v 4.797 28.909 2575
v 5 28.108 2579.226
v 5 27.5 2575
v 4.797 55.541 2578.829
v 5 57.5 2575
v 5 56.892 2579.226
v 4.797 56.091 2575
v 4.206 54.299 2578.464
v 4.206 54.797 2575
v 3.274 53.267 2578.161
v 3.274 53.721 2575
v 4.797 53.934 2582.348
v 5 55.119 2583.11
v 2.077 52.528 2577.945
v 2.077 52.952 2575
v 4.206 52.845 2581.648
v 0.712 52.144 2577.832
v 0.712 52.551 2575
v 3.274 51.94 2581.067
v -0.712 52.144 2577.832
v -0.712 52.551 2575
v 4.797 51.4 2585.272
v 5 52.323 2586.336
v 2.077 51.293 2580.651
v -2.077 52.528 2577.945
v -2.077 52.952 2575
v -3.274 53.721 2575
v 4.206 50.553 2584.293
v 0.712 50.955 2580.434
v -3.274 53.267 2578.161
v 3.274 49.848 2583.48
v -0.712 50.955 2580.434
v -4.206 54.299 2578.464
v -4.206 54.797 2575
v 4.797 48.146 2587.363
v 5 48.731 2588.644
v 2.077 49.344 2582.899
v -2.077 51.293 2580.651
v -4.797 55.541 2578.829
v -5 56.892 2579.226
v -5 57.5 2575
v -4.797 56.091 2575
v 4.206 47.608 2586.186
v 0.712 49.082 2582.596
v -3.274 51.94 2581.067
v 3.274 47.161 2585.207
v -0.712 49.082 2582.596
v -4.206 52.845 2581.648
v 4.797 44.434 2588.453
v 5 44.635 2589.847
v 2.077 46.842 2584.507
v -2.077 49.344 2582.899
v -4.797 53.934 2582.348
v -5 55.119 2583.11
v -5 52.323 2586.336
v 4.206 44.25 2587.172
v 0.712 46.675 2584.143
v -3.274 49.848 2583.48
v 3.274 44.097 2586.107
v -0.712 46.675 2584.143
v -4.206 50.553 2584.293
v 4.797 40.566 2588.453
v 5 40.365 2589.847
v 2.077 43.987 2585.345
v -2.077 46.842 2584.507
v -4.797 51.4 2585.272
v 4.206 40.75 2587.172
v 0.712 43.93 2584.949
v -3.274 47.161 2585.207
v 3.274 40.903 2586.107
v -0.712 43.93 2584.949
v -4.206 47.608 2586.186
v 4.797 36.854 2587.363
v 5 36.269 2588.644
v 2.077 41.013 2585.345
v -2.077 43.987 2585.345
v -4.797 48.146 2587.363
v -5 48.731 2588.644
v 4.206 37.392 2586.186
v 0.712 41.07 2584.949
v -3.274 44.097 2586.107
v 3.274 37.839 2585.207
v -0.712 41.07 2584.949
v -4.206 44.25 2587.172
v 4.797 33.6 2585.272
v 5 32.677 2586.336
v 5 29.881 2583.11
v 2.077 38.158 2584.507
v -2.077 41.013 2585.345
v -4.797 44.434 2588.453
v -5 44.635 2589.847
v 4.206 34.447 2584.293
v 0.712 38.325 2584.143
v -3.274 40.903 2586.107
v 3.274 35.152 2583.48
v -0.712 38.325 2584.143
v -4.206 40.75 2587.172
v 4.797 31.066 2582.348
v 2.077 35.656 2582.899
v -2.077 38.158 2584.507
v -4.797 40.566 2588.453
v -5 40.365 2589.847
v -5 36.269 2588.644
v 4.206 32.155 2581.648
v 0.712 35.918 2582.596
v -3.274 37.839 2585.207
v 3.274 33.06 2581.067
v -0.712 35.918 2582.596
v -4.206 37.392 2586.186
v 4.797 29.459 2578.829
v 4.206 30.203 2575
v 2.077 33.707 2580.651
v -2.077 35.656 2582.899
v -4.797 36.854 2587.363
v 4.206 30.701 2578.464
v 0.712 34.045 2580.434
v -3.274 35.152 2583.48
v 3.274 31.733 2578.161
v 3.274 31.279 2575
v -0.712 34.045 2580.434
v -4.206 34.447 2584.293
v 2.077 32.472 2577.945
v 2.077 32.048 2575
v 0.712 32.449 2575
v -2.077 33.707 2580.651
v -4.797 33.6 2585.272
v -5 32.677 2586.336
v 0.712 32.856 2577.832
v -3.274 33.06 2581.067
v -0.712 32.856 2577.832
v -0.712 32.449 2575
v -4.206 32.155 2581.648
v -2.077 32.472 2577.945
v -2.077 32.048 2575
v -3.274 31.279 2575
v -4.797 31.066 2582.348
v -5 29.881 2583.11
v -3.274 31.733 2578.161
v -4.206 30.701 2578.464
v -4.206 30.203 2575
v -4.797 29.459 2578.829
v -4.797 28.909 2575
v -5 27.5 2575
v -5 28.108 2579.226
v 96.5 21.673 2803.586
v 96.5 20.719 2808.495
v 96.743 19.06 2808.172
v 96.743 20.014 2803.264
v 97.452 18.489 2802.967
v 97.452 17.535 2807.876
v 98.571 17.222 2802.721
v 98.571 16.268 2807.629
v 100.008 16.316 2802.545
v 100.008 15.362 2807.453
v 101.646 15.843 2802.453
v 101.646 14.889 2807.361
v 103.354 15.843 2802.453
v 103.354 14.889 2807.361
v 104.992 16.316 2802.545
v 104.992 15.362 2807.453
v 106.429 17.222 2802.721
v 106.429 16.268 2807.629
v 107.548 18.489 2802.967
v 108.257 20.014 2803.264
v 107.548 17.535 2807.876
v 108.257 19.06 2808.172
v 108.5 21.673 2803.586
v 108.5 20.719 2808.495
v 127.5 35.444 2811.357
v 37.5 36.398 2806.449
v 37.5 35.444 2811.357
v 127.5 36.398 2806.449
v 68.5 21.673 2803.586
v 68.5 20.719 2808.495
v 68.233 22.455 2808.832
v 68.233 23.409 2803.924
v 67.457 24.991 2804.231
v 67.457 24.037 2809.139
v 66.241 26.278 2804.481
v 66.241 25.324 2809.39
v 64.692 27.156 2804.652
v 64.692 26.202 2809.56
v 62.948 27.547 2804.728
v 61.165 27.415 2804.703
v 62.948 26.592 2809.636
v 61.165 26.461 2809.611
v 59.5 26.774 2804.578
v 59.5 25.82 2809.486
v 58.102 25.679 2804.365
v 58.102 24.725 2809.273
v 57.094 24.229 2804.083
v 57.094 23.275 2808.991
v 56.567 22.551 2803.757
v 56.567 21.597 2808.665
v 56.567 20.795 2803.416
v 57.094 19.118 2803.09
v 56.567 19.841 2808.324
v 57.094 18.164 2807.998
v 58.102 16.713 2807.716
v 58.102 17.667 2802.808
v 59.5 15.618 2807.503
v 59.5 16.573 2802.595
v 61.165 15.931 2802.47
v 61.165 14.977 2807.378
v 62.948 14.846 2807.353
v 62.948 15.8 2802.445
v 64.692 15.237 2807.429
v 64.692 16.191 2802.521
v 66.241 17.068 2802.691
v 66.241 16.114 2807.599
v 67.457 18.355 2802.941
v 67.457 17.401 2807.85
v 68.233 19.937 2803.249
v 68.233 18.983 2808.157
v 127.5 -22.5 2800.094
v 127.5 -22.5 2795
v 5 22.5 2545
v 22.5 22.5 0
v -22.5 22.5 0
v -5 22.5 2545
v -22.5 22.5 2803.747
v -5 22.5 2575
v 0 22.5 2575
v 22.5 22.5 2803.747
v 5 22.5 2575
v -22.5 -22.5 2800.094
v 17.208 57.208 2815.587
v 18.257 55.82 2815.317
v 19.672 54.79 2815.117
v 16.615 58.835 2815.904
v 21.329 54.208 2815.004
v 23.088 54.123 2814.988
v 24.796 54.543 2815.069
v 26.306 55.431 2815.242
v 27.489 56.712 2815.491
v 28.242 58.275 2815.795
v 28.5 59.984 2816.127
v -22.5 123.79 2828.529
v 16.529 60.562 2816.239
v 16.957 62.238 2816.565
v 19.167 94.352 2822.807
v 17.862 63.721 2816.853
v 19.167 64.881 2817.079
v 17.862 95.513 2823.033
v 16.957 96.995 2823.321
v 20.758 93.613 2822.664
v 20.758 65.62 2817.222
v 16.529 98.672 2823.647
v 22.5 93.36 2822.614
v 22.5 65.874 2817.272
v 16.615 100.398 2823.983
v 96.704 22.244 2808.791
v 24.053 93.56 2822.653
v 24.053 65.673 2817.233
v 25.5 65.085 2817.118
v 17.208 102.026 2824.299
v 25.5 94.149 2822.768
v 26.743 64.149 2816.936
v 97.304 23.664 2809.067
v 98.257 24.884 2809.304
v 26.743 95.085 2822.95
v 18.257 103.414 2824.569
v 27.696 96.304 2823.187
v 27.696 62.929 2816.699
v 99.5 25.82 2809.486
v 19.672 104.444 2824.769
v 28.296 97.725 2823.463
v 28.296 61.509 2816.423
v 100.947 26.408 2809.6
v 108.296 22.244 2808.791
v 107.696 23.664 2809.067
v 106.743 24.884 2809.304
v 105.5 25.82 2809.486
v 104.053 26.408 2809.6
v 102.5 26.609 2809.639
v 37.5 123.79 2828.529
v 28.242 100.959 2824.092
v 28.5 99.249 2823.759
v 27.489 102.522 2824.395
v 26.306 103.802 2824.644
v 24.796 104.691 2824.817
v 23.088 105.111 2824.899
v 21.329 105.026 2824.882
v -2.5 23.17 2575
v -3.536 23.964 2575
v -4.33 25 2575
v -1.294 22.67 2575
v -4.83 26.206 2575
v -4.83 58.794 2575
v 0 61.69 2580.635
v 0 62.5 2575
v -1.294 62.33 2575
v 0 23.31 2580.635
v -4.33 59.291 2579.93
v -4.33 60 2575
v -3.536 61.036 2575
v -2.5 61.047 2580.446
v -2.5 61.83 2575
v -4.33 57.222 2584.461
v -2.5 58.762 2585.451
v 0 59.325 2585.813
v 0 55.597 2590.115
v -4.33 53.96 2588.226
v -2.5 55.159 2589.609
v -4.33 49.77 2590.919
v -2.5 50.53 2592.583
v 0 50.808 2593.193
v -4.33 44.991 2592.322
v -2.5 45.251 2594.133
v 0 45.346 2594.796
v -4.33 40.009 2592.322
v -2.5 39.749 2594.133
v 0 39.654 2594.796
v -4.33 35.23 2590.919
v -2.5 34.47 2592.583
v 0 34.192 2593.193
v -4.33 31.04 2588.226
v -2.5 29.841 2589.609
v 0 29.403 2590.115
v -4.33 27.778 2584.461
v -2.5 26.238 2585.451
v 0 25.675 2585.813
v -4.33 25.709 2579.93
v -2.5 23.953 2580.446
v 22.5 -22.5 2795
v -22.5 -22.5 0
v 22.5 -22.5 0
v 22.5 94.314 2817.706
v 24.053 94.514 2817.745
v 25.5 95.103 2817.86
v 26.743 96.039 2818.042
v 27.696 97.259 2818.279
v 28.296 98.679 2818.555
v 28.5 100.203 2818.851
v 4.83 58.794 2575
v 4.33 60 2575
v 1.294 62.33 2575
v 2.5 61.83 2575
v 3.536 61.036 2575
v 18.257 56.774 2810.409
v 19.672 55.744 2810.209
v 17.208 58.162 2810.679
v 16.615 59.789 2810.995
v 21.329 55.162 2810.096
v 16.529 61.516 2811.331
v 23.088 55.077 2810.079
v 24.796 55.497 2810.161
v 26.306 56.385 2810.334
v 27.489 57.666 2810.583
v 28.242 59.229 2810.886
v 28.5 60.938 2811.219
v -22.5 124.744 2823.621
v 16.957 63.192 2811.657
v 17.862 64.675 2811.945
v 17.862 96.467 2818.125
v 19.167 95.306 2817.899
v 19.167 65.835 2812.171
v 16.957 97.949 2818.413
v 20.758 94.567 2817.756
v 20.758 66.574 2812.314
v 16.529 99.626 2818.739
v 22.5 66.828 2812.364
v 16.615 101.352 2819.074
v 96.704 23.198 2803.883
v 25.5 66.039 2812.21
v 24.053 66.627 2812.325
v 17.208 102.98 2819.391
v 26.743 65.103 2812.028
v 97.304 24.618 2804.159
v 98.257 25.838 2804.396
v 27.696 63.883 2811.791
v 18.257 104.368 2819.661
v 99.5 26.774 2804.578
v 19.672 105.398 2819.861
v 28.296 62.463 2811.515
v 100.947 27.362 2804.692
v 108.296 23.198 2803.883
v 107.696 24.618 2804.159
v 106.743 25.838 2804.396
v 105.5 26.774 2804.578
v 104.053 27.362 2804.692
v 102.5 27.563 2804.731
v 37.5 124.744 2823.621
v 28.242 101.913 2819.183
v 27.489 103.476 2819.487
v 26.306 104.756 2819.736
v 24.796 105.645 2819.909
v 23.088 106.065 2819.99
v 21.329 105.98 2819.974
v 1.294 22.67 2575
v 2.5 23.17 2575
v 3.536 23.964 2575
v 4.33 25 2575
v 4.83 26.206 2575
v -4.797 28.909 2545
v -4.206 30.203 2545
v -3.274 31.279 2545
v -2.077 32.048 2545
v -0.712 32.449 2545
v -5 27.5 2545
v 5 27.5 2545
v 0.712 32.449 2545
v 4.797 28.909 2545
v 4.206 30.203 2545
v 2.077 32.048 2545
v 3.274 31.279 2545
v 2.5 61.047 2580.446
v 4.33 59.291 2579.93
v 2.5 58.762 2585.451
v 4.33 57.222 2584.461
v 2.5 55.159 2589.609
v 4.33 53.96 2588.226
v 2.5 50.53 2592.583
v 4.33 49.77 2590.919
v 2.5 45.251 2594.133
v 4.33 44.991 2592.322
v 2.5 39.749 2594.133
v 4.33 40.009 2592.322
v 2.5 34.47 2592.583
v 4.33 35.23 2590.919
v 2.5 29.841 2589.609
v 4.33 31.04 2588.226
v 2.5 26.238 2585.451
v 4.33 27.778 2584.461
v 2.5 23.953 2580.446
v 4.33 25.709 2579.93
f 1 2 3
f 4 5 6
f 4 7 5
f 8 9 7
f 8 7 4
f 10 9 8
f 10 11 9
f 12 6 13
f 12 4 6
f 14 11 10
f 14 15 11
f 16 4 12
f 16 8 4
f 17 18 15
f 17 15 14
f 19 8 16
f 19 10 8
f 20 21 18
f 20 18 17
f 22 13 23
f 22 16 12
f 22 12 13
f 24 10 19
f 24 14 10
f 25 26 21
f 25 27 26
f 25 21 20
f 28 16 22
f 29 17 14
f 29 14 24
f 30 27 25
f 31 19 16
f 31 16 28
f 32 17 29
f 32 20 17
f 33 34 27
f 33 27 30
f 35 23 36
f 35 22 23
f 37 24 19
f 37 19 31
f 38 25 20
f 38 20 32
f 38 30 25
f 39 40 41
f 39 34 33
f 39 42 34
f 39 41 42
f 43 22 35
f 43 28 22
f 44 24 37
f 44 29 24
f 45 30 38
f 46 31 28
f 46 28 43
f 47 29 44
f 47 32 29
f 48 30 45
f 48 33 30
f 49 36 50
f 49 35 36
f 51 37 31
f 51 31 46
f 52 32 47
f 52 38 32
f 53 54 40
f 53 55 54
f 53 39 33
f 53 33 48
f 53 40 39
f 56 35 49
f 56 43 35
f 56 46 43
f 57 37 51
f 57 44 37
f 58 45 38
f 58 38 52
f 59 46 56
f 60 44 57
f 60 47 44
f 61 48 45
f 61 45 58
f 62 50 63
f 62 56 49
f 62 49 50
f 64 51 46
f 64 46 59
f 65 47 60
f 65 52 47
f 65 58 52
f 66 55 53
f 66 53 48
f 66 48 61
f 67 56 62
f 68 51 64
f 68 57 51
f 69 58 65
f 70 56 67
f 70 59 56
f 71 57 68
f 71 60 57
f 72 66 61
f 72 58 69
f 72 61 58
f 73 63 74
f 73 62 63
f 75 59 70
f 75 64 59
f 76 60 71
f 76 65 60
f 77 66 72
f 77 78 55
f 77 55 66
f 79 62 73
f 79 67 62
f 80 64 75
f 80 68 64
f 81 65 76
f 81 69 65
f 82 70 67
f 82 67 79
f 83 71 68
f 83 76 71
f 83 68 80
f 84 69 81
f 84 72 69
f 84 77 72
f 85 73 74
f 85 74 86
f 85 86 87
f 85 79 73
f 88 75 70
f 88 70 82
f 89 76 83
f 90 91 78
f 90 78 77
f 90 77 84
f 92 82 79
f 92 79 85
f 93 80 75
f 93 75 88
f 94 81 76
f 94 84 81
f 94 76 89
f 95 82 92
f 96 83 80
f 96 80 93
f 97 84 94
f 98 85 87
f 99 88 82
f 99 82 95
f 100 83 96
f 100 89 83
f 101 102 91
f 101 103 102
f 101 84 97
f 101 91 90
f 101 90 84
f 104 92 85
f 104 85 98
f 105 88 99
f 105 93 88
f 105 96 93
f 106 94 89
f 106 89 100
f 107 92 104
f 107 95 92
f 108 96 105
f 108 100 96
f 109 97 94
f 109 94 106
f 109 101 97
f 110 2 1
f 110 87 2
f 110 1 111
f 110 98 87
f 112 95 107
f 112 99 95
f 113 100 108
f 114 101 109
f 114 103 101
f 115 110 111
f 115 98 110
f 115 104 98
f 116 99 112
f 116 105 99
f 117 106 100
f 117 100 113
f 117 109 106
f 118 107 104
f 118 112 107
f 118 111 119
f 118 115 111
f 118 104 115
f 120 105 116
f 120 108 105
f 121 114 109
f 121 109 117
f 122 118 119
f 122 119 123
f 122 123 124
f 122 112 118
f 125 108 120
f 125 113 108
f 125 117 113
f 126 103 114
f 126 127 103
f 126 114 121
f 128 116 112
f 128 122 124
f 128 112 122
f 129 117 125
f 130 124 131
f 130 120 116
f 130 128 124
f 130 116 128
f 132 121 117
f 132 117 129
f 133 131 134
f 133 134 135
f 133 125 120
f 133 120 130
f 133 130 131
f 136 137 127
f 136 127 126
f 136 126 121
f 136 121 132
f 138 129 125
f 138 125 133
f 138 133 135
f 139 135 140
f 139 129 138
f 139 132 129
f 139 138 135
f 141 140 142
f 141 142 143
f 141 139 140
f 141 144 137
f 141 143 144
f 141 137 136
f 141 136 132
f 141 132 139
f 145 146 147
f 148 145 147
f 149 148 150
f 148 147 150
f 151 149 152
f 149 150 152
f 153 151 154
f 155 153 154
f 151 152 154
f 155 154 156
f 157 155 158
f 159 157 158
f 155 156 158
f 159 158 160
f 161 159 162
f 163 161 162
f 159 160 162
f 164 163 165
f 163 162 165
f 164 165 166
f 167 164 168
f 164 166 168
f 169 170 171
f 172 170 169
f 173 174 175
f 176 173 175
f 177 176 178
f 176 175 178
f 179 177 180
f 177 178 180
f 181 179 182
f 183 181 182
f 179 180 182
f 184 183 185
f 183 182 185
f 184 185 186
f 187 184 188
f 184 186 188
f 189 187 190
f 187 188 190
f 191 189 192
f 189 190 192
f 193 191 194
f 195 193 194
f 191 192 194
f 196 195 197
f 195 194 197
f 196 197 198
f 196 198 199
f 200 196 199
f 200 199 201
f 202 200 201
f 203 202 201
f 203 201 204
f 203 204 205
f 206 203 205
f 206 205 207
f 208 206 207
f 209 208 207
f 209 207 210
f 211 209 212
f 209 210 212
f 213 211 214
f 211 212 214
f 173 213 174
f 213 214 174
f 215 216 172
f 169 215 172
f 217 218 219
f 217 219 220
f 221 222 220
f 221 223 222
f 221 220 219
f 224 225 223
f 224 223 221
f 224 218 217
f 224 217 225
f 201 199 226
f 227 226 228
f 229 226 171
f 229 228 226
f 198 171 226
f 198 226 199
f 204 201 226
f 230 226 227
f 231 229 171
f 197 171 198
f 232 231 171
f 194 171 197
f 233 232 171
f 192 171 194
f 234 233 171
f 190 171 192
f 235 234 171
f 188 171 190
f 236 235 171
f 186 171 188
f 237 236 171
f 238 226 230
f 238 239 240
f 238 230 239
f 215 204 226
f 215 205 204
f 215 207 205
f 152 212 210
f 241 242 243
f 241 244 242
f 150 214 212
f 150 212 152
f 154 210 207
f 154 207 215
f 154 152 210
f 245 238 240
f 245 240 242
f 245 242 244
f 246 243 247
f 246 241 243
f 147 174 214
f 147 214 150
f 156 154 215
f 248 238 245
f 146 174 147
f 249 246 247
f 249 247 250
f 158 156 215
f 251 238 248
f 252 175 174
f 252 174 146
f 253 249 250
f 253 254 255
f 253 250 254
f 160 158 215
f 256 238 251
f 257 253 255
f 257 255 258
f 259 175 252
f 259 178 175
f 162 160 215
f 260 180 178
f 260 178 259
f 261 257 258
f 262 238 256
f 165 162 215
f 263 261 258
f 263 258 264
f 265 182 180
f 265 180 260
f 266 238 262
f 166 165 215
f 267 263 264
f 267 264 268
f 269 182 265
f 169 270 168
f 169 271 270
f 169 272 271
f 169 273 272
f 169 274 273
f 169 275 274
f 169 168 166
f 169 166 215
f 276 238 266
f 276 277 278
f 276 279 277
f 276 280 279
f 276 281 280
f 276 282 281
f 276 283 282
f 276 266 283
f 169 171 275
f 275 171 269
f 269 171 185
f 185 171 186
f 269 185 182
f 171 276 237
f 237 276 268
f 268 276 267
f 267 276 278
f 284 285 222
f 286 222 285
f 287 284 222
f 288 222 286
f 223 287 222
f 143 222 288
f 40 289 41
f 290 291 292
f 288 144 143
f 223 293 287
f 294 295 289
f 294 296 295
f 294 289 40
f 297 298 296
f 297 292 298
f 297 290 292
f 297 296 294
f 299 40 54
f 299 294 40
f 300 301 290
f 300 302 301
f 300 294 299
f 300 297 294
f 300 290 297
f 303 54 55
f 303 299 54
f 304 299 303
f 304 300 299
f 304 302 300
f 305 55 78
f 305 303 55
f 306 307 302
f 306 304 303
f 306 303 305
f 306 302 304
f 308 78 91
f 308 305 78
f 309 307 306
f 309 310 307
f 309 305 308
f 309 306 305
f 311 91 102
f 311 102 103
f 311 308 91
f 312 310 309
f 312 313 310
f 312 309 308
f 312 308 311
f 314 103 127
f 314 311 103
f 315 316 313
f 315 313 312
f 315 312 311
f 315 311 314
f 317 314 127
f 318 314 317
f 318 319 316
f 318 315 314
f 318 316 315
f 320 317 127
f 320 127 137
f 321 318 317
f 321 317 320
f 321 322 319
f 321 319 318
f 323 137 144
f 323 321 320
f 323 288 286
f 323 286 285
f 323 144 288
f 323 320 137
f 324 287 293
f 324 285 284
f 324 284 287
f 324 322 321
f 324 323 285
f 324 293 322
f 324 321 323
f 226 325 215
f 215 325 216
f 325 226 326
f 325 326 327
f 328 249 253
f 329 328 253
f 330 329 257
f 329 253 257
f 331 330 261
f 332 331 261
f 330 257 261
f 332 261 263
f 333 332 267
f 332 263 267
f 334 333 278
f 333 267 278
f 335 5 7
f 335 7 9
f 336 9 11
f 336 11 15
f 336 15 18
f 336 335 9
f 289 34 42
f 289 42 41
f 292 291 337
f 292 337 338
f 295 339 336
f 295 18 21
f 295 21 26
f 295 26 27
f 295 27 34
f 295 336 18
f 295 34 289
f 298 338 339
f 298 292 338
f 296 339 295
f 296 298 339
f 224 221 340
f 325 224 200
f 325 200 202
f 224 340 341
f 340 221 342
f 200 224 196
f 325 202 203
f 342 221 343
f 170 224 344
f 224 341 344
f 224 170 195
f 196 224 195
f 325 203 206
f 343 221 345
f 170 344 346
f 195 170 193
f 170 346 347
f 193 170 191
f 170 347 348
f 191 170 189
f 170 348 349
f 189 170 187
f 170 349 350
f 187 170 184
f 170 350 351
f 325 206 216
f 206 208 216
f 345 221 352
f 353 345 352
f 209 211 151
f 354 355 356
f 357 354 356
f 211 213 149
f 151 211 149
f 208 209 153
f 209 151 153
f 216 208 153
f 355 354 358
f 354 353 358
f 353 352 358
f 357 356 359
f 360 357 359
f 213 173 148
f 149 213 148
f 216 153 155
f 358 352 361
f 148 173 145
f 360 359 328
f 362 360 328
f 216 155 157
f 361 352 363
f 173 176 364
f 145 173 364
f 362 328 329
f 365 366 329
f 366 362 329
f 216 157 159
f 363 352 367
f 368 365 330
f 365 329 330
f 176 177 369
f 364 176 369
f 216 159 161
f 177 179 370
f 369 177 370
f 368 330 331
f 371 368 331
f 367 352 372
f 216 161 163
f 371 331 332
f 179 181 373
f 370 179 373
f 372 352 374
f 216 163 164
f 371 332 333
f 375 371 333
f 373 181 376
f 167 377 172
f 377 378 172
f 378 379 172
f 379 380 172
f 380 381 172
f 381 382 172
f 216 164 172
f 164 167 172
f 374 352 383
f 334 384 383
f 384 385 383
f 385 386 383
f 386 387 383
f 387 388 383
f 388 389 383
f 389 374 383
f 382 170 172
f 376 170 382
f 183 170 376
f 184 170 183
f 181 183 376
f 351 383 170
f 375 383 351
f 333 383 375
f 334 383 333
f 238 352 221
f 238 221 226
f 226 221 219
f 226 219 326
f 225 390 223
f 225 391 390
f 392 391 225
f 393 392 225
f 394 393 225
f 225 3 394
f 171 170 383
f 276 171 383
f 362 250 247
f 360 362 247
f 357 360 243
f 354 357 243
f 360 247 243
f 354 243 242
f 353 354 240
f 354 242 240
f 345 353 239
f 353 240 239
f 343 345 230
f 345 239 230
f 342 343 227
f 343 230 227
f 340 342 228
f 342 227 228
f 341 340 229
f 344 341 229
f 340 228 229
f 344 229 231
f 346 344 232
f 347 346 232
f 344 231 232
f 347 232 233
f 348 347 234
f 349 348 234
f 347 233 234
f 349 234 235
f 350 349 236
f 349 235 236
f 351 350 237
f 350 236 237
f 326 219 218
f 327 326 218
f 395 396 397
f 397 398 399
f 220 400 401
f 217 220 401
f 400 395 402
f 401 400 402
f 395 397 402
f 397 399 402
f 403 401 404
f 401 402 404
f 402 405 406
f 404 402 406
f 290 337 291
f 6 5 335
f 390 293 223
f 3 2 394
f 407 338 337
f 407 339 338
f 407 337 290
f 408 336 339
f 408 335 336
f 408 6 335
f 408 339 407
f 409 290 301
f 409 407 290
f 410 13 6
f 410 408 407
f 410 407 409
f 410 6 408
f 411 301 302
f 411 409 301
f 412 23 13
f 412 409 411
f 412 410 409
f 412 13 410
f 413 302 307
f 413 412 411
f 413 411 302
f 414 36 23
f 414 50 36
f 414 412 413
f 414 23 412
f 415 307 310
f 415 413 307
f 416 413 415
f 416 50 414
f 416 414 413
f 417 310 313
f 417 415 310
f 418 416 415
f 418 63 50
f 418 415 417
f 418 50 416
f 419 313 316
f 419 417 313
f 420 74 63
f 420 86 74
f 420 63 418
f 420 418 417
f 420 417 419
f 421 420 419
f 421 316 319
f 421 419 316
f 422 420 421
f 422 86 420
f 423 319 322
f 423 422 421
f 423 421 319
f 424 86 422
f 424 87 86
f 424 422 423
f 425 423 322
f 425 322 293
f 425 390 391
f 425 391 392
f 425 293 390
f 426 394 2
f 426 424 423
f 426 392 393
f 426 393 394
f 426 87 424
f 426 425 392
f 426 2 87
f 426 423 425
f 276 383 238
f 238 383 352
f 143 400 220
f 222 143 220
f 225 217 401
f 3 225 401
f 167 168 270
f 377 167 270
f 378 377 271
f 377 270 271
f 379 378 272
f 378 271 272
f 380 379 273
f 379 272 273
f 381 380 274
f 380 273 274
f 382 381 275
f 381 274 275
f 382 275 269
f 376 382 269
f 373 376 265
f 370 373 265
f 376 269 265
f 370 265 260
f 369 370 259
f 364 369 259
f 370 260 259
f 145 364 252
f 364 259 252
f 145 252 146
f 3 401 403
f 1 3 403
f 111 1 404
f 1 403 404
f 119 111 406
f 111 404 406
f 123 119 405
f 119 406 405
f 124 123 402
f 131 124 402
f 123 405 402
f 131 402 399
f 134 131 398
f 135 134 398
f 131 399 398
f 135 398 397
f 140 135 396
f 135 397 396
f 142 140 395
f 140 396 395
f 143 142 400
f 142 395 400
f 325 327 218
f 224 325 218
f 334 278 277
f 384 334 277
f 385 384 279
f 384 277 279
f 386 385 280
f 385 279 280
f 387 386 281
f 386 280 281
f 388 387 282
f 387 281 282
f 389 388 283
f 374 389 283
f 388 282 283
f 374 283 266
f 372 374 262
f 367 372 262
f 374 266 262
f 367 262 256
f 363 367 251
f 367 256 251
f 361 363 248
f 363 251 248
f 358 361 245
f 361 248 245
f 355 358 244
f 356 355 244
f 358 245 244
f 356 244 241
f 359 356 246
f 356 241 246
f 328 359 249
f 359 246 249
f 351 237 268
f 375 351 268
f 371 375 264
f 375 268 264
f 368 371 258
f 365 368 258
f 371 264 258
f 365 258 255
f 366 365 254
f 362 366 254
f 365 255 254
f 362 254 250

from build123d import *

# Parameters (mm, degrees)
F0_W      = 45
F0_H      = 45
F1_DEPTH  = 2795
F3_W      = 90
F3_H      = 60
F4_DEPTH  = 5
F6_DEPTH  = 45
F8_W      = 2.7798460424
F8_H      = 5.7082939148
F9_DEPTH  = 150
F10_R     = 6
F11_DEPTH = 5
F15_DEPTH = 30


with BuildPart() as f1:
    # F0 (on Top) → F1 (new body)
    with BuildSketch(Plane.XY):
        Rectangle(F0_W, F0_H)
    extrude(amount=F1_DEPTH)


with BuildPart() as f4:
    # F3 (on face) → F4 (new body)
    with BuildSketch(Plane(origin=(0, -524.3318959349, 2697.453760933), x_dir=(1, 0, 0), z_dir=(0, -0.1908089954, 0.9816271834))):
        Polygon((-22.5, 661.2245304499), (-22.5, 511.2245304499), (37.5, 511.2245304499), (37.5, 571.2245304499), (37.5, 661.2245304499), align=None)
        with Locations((82.5, 541.2245304499)):
            Rectangle(F3_W, F3_H)
    extrude(amount=F4_DEPTH)


with BuildPart() as f6:
    # F5 (on face) → F6 (new body)
    with BuildSketch(Plane.YZ.offset(22.5)):
        Polygon((-22.5, 2795), (22.5, 2795), (22.5, 2803.7471139112), align=None)
    extrude(amount=-F6_DEPTH)


with BuildPart() as f1_1:
    add(f1.part)

    # F7: union F6, F4
    add(f6.part)
    add(f4.part)

    # F8 (on face) → F9 (cut, through all)
    with BuildSketch(Plane(origin=(-22.5, 0, 0), x_dir=(0, -1, 0), z_dir=(-1, 0, 0))):
        with Locations((23.8899230212, 2797.8541469574)):
            Rectangle(F8_W, F8_H)
    extrude(amount=-F9_DEPTH, mode=Mode.SUBTRACT)

    # F10 (on face) → F11 (cut, through all)
    with BuildSketch(Plane(origin=(0, -525.2859409117, 2702.3618968503), x_dir=(1, 0, 0), z_dir=(0, -0.1908089954, 0.9816271834))):
        with BuildLine():
            ThreePointArc((108.5, 556.2245304499), (106.7426406871, 560.467171137), (102.5, 562.2245304499))
            Line((102.5, 562.2245304499), (102.5, 556.2245304499))
            Line((102.5, 556.2245304499), (96.5, 556.2245304499))
            ThreePointArc((96.5, 556.2245304499), (102.5, 550.2245304499), (108.5, 556.2245304499))
        make_face()
        with Locations((62.5, 556.2245304499)):
            Circle(F10_R)
        with BuildLine():
            Line((102.5, 556.2245304499), (102.5, 562.2245304499))
            ThreePointArc((102.5, 562.2245304499), (98.2573593129, 560.467171137), (96.5, 556.2245304499))
            Line((96.5, 556.2245304499), (102.5, 556.2245304499))
        make_face()
        with BuildLine():
            ThreePointArc((22.5, 630.2245304499), (26.7426406871, 631.9818897628), (28.5, 636.2245304499))
            Line((28.5, 636.2245304499), (22.5, 636.2245304499))
            Line((22.5, 636.2245304499), (22.5, 630.2245304499))
        make_face()
        with BuildLine():
            Line((22.5, 636.2245304499), (28.5, 636.2245304499))
            ThreePointArc((28.5, 636.2245304499), (18.2573593129, 640.467171137), (22.5, 630.2245304499))
            Line((22.5, 630.2245304499), (22.5, 636.2245304499))
        make_face()
        with BuildLine():
            ThreePointArc((28.5, 596.2245304499), (26.7426406871, 600.467171137), (22.5, 602.2245304499))
            ThreePointArc((22.5, 602.2245304499), (18.2573593129, 591.9818897628), (28.5, 596.2245304499))
        make_face()
    extrude(amount=-F11_DEPTH, mode=Mode.SUBTRACT)

    # F13 (on offset) → F15 (join)
    with BuildSketch(Plane.XY.offset(2545)):
        with BuildLine():
            ThreePointArc((-5, 27.5), (-3.5355339059, 23.9644660941), (0, 22.5))
            Line((0, 22.5), (0, 27.5))
            Line((0, 27.5), (-5, 27.5))
        make_face()
        with BuildLine():
            Line((-5, 22.5), (0, 22.5))
            ThreePointArc((0, 22.5), (-3.5355339059, 23.9644660941), (-5, 27.5))
            Line((-5, 27.5), (-5, 22.5))
        make_face()
        with BuildLine():
            Line((0, 27.5), (0, 22.5))
            ThreePointArc((0, 22.5), (3.5355339059, 23.9644660941), (5, 27.5))
            Line((5, 27.5), (0, 27.5))
        make_face()
        with BuildLine():
            ThreePointArc((5, 27.5), (3.5355339059, 23.9644660941), (0, 22.5))
            Line((0, 22.5), (5, 22.5))
            Line((5, 22.5), (5, 27.5))
        make_face()
        with BuildLine():
            Line((-5, 27.5), (0, 27.5))
            Line((0, 27.5), (5, 27.5))
            ThreePointArc((5, 27.5), (0, 32.5), (-5, 27.5))
        make_face()
    extrude(amount=F15_DEPTH)

    # F17: sweep along a path in F14
    with BuildLine(Plane.YZ) as f17_path:
        ThreePointArc((57.5, 2575), (42.5, 2590), (27.5, 2575))
    # F16 (on face) → F17 (sweep)
    with BuildSketch(Plane.XY.offset(2575)):
        with BuildLine():
            ThreePointArc((0, 22.5), (3.5355339059, 23.9644660941), (5, 27.5))
            ThreePointArc((5, 27.5), (0, 32.5), (-5, 27.5))
            ThreePointArc((-5, 27.5), (-3.5355339059, 23.9644660941), (0, 22.5))
        make_face()
    sweep(path=f17_path.line)


solid = f1_1.part
